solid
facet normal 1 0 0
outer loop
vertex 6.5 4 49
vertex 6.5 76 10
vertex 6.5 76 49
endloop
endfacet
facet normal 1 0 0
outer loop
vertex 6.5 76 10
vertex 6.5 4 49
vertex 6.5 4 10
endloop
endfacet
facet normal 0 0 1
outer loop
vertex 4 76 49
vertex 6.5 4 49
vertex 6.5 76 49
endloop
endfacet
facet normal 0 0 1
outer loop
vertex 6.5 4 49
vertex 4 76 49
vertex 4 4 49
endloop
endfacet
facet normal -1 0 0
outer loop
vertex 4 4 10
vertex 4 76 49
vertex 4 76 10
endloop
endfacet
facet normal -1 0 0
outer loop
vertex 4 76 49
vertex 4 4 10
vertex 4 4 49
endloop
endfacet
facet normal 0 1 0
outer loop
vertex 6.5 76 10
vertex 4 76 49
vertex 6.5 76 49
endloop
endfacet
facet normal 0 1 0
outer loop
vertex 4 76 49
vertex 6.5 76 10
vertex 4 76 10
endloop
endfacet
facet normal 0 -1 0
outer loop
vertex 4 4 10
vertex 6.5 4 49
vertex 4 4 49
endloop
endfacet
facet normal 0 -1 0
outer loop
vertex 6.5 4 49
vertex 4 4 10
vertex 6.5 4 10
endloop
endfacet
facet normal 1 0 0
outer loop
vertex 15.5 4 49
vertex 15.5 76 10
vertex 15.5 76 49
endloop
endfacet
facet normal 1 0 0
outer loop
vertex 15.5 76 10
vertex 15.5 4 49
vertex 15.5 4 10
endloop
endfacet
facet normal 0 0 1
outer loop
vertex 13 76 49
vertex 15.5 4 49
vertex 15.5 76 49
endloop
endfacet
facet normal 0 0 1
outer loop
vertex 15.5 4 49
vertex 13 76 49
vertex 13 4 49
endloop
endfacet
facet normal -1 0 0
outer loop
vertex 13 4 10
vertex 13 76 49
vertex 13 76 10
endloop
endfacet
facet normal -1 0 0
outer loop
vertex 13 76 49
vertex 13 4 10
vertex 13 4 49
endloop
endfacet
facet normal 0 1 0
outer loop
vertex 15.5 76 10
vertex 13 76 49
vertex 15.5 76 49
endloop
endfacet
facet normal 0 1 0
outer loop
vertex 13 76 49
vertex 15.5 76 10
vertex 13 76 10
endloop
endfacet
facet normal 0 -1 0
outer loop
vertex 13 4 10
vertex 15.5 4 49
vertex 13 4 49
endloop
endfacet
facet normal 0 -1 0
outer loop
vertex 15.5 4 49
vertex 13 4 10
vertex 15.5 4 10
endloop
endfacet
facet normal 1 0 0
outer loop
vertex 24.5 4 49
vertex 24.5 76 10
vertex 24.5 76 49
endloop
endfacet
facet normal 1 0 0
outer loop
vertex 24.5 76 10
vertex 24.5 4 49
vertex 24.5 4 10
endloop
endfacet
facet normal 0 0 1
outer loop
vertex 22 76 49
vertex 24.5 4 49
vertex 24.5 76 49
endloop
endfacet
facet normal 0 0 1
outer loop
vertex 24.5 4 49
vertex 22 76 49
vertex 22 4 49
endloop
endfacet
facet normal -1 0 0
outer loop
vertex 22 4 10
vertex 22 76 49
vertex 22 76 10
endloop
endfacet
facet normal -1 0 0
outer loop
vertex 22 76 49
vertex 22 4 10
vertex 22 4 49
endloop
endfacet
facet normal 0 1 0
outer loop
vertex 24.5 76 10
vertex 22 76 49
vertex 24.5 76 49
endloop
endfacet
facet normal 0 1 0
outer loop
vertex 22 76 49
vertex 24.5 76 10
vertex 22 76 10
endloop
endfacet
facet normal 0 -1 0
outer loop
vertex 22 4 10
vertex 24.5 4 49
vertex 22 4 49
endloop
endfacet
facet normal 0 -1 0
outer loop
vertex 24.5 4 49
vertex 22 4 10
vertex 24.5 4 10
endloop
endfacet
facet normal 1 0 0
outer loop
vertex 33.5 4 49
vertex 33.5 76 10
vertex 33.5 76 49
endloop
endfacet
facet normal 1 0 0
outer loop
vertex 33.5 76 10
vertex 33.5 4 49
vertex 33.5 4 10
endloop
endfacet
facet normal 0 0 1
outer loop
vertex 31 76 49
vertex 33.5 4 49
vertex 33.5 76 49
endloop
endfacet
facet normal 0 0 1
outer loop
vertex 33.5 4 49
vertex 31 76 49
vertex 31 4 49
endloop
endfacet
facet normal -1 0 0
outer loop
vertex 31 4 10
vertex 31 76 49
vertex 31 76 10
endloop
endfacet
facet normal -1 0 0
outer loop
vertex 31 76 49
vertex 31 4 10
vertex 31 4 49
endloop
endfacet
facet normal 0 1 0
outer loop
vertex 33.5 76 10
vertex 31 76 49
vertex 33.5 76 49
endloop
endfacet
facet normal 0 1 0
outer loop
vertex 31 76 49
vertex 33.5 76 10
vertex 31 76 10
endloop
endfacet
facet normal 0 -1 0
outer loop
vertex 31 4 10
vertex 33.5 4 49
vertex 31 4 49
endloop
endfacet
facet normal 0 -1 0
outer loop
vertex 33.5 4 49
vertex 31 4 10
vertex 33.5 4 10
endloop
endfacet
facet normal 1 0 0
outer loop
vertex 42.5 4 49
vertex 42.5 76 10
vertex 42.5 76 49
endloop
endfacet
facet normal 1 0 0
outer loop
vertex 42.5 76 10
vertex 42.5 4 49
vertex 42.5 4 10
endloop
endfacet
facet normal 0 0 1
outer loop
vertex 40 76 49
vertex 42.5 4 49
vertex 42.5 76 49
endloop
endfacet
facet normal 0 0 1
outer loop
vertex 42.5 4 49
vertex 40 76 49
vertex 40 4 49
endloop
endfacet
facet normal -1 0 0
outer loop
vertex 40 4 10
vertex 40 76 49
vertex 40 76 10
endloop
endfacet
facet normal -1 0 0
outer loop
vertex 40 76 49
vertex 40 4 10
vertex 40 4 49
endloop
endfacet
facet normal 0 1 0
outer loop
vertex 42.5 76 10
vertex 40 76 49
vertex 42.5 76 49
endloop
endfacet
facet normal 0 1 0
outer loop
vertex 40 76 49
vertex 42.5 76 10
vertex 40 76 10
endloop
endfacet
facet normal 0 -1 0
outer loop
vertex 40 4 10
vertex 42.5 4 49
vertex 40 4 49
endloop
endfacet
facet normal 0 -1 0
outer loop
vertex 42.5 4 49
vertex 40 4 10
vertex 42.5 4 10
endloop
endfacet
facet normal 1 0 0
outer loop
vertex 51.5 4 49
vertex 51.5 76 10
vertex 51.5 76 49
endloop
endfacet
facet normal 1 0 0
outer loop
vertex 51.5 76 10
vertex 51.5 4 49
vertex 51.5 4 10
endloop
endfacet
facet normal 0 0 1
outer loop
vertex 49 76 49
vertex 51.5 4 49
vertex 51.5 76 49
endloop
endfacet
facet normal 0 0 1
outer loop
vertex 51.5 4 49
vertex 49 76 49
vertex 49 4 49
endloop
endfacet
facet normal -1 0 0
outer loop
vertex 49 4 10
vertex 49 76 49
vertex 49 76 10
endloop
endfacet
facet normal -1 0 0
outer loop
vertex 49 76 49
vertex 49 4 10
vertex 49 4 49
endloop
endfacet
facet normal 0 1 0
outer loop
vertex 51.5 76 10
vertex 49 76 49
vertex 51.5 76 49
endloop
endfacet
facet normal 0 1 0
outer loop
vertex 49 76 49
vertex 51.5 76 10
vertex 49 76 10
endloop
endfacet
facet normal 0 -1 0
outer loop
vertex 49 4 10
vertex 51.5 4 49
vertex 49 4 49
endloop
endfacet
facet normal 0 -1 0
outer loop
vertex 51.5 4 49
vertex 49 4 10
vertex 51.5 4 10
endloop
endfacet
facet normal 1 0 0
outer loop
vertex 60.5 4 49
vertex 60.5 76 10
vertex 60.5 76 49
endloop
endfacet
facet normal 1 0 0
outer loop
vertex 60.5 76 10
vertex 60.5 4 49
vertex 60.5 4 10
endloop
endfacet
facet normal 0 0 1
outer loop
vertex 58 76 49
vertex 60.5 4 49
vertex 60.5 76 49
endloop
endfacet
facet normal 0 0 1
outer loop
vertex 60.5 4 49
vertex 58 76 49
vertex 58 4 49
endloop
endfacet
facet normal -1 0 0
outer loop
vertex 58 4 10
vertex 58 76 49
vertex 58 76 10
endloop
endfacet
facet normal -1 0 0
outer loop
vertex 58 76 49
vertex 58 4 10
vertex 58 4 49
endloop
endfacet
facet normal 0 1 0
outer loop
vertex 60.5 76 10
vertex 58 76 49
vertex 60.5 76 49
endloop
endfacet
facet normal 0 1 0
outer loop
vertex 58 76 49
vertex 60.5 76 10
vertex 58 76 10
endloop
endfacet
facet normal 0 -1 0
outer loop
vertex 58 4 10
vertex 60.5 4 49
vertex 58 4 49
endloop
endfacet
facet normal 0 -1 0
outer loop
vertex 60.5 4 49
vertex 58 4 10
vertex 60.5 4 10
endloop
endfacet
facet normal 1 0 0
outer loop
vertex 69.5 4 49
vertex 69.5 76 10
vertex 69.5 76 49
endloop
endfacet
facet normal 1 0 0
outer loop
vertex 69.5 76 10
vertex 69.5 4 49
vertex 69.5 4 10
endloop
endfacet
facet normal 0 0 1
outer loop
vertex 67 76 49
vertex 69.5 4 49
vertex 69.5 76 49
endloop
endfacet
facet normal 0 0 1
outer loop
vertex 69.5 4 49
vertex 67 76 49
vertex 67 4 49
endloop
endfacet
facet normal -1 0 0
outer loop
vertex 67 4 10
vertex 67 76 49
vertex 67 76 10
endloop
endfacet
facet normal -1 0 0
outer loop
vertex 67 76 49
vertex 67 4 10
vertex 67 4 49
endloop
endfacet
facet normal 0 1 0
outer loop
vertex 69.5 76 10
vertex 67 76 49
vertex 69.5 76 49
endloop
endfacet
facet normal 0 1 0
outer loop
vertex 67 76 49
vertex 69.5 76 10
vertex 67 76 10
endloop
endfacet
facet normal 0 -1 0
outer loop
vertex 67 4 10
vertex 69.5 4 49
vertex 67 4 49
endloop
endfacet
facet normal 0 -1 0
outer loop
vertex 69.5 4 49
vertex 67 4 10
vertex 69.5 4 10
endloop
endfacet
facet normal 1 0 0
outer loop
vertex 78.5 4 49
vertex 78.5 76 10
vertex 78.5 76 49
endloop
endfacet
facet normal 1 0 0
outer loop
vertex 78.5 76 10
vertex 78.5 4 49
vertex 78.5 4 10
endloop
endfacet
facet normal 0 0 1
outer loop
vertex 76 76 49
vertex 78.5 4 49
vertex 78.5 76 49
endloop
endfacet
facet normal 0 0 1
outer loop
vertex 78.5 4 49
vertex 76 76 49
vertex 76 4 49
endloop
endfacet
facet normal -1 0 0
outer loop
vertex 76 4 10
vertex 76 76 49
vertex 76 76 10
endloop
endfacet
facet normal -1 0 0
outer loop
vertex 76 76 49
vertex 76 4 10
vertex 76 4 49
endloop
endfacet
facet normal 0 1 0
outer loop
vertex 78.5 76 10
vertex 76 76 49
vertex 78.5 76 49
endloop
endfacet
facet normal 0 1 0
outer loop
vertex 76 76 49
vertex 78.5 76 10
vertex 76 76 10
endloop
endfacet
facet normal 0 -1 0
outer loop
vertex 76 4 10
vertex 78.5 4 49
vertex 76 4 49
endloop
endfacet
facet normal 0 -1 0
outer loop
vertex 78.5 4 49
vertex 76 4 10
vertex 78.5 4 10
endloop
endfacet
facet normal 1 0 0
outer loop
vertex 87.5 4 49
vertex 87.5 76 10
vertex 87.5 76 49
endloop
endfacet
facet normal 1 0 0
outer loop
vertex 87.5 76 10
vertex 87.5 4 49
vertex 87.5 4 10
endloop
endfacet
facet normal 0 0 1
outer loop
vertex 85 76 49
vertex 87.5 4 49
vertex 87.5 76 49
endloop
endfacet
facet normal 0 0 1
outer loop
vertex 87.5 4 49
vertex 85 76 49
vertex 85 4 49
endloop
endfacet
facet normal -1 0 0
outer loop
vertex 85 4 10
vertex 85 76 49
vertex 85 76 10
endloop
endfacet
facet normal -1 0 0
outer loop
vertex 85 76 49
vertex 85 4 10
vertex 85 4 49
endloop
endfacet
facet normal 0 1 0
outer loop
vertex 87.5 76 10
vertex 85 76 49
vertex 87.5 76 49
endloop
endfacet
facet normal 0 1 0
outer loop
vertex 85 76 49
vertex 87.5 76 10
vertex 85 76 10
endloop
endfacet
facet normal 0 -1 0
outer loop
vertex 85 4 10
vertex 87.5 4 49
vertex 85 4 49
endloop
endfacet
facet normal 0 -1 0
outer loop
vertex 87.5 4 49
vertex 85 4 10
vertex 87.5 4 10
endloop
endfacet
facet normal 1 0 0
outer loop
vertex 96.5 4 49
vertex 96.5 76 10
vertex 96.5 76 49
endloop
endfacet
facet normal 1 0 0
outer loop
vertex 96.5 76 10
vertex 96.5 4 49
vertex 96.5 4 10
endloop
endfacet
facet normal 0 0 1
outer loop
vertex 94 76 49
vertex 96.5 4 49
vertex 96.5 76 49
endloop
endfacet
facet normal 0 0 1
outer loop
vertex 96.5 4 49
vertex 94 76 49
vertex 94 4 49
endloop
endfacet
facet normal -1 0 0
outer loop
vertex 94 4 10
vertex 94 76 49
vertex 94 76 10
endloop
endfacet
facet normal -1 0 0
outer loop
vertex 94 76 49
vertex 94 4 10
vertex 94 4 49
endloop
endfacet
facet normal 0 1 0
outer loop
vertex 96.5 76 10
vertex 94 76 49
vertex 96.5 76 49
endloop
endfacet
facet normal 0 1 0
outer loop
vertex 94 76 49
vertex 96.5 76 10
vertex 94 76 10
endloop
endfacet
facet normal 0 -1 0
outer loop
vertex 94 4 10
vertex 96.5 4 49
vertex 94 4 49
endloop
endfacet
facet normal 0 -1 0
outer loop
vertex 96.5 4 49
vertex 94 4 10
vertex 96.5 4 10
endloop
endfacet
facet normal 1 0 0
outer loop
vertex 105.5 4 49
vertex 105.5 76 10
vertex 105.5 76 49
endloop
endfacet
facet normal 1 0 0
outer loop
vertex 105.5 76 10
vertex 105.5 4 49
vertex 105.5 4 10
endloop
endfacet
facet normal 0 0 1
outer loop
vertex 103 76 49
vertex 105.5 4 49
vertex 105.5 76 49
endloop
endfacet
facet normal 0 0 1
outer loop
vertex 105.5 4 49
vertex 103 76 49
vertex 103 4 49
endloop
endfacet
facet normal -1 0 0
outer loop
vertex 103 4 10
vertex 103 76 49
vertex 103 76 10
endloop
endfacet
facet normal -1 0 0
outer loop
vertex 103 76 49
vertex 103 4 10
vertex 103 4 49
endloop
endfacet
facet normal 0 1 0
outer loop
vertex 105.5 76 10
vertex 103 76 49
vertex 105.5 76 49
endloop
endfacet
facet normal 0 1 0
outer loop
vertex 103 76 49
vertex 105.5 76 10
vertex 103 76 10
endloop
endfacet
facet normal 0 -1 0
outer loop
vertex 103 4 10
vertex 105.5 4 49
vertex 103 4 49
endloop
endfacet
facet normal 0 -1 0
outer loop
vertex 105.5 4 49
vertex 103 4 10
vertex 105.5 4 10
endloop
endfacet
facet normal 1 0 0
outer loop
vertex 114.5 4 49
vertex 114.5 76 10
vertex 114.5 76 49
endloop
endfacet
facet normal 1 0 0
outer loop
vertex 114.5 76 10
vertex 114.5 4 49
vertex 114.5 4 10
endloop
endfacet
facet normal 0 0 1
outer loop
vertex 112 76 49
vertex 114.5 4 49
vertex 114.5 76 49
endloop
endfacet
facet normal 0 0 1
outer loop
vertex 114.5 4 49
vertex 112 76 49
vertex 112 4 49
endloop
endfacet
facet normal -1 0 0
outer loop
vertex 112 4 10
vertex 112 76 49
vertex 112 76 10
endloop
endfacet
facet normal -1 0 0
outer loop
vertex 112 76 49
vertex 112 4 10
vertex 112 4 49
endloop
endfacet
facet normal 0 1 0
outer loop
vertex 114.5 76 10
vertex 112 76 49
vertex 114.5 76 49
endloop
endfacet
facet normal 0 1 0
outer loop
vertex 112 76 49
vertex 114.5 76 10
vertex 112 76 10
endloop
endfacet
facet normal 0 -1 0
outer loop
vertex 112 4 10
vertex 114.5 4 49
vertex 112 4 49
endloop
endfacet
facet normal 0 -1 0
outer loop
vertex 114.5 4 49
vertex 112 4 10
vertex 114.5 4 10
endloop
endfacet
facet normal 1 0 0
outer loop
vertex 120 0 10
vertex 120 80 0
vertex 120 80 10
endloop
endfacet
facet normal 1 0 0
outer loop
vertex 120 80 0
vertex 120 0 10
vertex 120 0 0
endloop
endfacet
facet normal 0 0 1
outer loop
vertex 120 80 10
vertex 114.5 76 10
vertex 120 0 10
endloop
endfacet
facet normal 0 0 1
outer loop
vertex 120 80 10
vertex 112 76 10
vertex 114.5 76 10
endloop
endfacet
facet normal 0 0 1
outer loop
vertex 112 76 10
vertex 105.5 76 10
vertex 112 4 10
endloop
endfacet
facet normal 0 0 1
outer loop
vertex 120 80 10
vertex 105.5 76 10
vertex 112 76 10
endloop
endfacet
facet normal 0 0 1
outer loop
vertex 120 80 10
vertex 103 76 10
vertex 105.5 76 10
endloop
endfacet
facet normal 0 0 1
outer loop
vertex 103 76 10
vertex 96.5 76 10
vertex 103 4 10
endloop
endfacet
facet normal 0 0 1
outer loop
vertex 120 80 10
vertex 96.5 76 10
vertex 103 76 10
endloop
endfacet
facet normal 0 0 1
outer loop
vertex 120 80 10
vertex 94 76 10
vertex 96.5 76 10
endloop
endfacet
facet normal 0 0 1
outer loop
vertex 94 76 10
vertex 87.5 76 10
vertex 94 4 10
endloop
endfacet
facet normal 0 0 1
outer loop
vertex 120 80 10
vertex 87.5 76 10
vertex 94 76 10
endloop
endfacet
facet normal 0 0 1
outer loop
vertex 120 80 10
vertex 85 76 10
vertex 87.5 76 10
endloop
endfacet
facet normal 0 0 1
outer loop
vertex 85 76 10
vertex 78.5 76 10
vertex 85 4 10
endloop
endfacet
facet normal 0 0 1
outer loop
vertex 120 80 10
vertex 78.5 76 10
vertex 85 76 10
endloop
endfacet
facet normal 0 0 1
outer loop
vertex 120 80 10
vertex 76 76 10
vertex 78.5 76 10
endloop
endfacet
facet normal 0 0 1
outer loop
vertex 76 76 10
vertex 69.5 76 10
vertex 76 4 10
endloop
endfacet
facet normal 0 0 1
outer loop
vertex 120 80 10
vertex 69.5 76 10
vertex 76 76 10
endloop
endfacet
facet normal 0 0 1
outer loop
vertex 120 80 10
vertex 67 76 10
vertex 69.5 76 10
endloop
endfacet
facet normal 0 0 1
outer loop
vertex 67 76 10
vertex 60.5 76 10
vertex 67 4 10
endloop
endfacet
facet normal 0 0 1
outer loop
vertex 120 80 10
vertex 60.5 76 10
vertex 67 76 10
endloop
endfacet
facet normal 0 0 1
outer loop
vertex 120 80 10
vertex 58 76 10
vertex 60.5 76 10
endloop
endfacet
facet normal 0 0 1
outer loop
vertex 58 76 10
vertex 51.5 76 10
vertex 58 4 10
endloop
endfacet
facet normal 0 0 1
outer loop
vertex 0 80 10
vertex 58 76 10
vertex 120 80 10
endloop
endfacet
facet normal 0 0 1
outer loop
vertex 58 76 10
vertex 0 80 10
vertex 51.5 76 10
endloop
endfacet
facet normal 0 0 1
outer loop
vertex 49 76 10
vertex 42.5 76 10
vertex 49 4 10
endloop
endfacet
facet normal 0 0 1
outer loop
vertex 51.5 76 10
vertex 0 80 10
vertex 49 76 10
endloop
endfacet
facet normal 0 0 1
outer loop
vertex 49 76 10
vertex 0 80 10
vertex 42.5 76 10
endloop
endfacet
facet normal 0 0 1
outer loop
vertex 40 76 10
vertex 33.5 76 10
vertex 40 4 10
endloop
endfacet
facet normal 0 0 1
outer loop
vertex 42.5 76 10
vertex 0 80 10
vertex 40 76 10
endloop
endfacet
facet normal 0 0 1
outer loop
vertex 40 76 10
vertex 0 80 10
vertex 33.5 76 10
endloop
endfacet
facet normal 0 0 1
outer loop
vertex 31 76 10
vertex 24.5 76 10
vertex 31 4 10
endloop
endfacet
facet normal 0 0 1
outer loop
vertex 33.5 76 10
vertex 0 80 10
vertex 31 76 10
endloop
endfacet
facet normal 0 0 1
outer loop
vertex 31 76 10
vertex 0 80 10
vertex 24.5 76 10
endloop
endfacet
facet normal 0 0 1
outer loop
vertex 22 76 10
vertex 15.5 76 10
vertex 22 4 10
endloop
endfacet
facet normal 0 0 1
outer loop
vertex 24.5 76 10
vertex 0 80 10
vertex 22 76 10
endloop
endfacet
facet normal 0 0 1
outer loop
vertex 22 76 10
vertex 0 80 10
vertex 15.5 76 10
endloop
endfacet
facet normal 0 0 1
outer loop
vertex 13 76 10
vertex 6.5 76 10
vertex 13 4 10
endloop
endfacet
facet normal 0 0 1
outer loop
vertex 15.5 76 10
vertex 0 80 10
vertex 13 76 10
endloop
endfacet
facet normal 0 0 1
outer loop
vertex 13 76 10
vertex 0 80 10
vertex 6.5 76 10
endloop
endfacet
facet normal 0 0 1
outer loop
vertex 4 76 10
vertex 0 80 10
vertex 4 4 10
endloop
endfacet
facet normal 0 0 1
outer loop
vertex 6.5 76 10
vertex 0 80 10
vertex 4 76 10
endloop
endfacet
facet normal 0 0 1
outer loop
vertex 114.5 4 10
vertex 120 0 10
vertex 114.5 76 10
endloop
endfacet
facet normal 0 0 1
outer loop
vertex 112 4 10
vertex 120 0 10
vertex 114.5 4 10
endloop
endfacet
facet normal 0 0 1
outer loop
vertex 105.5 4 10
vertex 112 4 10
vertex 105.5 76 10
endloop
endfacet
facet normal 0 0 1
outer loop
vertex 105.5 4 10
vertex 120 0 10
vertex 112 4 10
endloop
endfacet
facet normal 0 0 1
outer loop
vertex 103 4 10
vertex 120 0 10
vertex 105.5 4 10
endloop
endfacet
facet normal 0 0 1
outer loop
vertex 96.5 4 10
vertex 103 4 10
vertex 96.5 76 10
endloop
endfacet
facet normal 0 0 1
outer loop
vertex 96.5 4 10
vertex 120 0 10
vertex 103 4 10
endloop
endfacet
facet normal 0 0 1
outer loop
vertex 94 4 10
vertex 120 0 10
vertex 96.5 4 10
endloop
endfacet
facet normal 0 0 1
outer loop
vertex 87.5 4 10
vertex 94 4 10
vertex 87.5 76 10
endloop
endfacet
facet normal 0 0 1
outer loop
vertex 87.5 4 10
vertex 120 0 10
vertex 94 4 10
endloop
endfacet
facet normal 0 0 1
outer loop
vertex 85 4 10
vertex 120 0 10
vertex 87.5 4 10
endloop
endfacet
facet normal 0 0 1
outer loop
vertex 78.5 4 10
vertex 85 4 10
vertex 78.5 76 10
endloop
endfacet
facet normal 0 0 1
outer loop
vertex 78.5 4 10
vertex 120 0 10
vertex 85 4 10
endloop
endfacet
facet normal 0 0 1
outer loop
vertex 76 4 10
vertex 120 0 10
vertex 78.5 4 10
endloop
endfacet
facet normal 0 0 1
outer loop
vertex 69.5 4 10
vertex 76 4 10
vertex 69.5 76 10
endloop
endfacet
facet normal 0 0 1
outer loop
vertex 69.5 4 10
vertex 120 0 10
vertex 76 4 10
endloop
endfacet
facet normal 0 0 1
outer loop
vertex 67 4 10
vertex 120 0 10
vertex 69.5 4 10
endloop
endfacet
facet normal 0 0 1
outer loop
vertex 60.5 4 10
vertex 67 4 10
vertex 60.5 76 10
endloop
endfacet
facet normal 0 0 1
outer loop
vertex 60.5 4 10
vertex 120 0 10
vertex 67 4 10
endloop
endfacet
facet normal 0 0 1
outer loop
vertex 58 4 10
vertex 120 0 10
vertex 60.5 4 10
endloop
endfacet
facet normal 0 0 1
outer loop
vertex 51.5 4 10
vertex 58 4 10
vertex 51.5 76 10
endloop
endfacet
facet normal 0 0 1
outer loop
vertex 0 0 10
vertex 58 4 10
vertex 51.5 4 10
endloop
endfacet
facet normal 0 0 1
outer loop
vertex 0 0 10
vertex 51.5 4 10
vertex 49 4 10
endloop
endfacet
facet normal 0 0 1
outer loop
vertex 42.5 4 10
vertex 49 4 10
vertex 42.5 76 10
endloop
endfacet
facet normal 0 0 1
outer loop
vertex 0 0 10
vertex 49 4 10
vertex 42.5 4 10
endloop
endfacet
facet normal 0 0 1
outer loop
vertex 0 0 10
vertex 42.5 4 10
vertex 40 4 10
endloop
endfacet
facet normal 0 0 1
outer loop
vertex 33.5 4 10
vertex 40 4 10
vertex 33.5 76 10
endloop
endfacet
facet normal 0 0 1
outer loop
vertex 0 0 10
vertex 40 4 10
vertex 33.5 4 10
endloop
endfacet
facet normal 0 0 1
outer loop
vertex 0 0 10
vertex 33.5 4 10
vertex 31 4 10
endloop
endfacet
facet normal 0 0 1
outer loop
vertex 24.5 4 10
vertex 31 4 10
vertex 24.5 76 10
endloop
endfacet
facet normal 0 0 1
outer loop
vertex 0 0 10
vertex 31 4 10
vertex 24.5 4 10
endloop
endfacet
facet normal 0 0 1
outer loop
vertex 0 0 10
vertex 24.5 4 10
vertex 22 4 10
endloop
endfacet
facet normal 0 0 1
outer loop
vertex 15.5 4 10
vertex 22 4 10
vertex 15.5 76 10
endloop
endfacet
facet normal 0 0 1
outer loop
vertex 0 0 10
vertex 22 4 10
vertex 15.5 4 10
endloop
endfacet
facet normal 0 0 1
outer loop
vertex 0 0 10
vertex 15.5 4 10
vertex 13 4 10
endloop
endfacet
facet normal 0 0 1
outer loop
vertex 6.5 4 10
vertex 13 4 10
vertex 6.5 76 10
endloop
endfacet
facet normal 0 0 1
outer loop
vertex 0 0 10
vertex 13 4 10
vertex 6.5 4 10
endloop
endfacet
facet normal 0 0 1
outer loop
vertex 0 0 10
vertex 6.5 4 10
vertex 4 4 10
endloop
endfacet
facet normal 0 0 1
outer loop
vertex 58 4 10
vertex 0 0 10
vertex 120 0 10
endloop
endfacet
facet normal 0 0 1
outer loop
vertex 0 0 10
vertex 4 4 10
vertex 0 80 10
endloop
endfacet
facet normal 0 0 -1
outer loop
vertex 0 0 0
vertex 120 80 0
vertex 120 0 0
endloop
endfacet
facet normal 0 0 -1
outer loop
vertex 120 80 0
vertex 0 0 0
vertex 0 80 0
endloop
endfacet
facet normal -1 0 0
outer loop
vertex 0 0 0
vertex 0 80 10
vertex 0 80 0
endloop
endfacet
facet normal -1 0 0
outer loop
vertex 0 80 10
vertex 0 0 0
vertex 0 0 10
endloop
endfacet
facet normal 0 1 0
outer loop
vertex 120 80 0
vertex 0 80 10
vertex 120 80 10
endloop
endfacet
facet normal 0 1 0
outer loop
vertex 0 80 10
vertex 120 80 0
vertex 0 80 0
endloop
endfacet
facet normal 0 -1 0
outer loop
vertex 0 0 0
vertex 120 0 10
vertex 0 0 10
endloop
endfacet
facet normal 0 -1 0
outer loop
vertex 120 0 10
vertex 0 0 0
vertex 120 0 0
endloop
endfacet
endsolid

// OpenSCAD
$fn = 32;

// ----------------------------------------------------------------------
// Heatsink: uniform fin block
// ----------------------------------------------------------------------

// --- parameters (mm) ---
base_l = 120;             // base length, X
base_w = 80;              // base width, Y
base_t = 10;              // base plate thickness
fin_h = 40;               // fin height above the base
fin_t = 2.5;              // fin thickness
edge = 4;                 // margin from the base ends
pitch = 9;                // fin pitch

n_fins = floor((base_l - 2 * edge - fin_t) / pitch) + 1;  // fin count
total_h = base_t + fin_h - 1;  // overall height

union() {
  cube([base_l, base_w, base_t]);
  for (i = [0 : n_fins - 1])
    translate([edge + i * pitch, edge, base_t - 1])
      cube([fin_t, base_w - 2 * edge, fin_h]);
}
